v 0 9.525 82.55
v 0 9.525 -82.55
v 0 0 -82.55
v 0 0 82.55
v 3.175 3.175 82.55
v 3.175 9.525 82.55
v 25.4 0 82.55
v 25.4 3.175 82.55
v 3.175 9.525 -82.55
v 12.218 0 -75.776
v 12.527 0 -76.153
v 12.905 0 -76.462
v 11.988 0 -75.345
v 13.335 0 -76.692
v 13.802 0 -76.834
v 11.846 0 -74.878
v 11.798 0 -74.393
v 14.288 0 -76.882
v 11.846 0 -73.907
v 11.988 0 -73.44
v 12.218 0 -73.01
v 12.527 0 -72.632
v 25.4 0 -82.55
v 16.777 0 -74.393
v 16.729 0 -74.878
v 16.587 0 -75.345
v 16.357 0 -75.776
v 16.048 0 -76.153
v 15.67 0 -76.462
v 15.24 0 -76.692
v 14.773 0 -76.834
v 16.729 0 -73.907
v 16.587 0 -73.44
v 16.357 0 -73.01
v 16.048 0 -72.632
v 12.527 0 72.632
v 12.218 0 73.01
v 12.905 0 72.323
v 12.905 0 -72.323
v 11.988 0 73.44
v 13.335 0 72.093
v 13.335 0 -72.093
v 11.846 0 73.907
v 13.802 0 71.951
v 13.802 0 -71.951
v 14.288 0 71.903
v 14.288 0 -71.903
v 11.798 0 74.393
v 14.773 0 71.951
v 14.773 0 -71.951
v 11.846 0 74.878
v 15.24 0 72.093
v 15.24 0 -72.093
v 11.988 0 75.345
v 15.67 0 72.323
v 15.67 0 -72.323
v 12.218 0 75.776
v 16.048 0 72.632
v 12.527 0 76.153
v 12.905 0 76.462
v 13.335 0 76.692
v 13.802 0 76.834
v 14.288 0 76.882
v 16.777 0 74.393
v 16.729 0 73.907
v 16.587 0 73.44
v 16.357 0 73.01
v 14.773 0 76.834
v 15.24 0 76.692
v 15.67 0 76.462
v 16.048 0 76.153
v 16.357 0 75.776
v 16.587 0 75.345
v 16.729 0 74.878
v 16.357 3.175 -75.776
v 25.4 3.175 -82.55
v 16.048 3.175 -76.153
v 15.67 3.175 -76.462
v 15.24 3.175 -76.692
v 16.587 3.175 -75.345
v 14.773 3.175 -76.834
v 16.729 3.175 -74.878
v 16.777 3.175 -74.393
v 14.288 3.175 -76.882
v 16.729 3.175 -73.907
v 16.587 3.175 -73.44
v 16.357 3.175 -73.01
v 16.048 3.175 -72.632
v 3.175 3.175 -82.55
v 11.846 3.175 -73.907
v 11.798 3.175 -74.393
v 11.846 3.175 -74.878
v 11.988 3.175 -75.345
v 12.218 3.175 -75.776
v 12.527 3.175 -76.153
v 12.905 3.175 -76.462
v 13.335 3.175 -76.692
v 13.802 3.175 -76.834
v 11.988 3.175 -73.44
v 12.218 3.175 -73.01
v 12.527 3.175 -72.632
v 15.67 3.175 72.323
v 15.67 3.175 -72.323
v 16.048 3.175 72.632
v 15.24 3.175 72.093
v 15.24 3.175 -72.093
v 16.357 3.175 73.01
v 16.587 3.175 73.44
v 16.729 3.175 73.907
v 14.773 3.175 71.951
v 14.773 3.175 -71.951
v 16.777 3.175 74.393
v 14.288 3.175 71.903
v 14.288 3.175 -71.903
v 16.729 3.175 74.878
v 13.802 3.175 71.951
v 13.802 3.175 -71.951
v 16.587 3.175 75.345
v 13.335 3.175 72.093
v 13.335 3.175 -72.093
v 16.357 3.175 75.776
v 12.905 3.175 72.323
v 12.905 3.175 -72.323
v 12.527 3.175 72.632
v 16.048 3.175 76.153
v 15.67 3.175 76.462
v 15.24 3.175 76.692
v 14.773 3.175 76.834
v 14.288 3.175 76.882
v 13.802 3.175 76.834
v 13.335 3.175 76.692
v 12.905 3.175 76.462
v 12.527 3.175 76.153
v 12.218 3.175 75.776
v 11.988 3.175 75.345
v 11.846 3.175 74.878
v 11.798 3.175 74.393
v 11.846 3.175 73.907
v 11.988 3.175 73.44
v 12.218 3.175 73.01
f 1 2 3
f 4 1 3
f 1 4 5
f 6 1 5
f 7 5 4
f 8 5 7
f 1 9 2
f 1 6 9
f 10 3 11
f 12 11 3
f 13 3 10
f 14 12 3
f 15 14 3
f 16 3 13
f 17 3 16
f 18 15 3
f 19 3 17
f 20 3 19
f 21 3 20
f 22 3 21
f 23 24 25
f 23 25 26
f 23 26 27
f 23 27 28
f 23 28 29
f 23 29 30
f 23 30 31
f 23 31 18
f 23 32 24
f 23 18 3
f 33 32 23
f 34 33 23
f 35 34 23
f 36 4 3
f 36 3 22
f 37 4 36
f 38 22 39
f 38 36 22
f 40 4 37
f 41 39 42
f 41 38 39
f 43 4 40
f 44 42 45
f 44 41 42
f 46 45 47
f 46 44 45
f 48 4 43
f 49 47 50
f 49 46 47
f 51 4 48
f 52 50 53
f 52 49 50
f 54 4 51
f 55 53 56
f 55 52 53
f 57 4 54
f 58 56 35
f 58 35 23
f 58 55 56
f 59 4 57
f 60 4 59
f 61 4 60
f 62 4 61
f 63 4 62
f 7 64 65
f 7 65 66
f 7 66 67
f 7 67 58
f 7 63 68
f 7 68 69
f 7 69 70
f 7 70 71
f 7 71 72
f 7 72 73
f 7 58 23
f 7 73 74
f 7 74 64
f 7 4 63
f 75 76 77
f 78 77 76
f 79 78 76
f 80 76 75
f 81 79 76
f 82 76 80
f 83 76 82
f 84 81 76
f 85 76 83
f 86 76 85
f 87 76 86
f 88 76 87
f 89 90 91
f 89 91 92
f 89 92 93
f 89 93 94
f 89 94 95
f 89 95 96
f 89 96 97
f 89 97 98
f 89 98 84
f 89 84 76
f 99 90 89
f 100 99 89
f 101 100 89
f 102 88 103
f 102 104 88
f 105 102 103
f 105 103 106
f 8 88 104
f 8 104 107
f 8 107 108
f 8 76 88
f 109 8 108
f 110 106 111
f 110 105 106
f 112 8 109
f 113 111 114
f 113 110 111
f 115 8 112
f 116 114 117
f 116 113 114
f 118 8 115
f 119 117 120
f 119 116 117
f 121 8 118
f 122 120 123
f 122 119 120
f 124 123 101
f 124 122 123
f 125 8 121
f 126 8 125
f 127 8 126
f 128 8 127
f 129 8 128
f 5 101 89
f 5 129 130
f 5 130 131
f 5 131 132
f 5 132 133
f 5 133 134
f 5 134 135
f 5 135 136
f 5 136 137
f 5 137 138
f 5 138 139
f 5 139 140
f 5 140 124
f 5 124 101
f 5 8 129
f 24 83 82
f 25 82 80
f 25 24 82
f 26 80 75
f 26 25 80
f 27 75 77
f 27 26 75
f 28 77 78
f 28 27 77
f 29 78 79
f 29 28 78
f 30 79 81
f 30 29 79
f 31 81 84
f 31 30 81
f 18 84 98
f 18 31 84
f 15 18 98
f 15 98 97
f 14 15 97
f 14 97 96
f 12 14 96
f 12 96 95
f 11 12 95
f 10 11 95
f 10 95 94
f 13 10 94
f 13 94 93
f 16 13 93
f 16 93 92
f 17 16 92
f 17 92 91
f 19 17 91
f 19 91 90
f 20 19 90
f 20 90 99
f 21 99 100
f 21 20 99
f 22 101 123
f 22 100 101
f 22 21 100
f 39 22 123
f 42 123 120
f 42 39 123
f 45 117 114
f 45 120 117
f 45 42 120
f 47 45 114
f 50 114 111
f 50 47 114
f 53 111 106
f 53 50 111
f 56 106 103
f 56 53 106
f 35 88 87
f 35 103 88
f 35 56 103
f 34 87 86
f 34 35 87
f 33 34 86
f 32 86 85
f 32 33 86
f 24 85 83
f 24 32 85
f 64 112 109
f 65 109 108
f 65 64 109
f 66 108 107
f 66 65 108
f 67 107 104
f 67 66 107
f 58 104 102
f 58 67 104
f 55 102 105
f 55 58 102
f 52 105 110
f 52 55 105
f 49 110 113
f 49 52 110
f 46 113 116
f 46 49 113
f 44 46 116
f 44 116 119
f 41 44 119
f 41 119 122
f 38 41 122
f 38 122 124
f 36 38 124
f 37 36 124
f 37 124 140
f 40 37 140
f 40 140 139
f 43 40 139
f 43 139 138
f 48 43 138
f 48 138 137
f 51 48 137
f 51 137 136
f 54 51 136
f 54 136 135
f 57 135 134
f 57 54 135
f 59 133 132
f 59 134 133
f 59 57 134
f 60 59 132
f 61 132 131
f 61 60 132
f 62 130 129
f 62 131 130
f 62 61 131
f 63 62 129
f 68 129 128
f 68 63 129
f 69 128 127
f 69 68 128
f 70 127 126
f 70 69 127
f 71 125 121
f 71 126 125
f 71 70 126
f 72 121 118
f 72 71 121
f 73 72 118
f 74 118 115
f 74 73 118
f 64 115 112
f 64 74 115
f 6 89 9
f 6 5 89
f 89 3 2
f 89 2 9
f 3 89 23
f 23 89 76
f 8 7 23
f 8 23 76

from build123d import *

# Parameters (mm, degrees)
BOSS_EXTRUDE1_DEPTH = 82.55
SKETCH2_R           = 2.4892
CUT_EXTRUDE4_DEPTH  = 10.525


with BuildPart() as part:
    # Sketch1 → Boss-Extrude1 (new body, symmetric)
    with BuildSketch(Plane.XY):
        Polygon((0, 9.525), (0, 0), (25.4, 0), (25.4, 3.175), (3.175, 3.175), (3.175, 9.525), align=None)
    extrude(amount=BOSS_EXTRUDE1_DEPTH, both=True)

    # Sketch2 → Cut-Extrude4 (cut, through all)
    with BuildSketch(Plane(origin=(0, 0, 0), x_dir=(1, 0, 0), z_dir=(0, 1, 0))):
        with Locations((14.2875, -74.3926249)):
            Circle(SKETCH2_R)
        with Locations((14.2875, 74.3926249)):
            Circle(SKETCH2_R)
    extrude(amount=CUT_EXTRUDE4_DEPTH, mode=Mode.SUBTRACT)


solid = part.part
